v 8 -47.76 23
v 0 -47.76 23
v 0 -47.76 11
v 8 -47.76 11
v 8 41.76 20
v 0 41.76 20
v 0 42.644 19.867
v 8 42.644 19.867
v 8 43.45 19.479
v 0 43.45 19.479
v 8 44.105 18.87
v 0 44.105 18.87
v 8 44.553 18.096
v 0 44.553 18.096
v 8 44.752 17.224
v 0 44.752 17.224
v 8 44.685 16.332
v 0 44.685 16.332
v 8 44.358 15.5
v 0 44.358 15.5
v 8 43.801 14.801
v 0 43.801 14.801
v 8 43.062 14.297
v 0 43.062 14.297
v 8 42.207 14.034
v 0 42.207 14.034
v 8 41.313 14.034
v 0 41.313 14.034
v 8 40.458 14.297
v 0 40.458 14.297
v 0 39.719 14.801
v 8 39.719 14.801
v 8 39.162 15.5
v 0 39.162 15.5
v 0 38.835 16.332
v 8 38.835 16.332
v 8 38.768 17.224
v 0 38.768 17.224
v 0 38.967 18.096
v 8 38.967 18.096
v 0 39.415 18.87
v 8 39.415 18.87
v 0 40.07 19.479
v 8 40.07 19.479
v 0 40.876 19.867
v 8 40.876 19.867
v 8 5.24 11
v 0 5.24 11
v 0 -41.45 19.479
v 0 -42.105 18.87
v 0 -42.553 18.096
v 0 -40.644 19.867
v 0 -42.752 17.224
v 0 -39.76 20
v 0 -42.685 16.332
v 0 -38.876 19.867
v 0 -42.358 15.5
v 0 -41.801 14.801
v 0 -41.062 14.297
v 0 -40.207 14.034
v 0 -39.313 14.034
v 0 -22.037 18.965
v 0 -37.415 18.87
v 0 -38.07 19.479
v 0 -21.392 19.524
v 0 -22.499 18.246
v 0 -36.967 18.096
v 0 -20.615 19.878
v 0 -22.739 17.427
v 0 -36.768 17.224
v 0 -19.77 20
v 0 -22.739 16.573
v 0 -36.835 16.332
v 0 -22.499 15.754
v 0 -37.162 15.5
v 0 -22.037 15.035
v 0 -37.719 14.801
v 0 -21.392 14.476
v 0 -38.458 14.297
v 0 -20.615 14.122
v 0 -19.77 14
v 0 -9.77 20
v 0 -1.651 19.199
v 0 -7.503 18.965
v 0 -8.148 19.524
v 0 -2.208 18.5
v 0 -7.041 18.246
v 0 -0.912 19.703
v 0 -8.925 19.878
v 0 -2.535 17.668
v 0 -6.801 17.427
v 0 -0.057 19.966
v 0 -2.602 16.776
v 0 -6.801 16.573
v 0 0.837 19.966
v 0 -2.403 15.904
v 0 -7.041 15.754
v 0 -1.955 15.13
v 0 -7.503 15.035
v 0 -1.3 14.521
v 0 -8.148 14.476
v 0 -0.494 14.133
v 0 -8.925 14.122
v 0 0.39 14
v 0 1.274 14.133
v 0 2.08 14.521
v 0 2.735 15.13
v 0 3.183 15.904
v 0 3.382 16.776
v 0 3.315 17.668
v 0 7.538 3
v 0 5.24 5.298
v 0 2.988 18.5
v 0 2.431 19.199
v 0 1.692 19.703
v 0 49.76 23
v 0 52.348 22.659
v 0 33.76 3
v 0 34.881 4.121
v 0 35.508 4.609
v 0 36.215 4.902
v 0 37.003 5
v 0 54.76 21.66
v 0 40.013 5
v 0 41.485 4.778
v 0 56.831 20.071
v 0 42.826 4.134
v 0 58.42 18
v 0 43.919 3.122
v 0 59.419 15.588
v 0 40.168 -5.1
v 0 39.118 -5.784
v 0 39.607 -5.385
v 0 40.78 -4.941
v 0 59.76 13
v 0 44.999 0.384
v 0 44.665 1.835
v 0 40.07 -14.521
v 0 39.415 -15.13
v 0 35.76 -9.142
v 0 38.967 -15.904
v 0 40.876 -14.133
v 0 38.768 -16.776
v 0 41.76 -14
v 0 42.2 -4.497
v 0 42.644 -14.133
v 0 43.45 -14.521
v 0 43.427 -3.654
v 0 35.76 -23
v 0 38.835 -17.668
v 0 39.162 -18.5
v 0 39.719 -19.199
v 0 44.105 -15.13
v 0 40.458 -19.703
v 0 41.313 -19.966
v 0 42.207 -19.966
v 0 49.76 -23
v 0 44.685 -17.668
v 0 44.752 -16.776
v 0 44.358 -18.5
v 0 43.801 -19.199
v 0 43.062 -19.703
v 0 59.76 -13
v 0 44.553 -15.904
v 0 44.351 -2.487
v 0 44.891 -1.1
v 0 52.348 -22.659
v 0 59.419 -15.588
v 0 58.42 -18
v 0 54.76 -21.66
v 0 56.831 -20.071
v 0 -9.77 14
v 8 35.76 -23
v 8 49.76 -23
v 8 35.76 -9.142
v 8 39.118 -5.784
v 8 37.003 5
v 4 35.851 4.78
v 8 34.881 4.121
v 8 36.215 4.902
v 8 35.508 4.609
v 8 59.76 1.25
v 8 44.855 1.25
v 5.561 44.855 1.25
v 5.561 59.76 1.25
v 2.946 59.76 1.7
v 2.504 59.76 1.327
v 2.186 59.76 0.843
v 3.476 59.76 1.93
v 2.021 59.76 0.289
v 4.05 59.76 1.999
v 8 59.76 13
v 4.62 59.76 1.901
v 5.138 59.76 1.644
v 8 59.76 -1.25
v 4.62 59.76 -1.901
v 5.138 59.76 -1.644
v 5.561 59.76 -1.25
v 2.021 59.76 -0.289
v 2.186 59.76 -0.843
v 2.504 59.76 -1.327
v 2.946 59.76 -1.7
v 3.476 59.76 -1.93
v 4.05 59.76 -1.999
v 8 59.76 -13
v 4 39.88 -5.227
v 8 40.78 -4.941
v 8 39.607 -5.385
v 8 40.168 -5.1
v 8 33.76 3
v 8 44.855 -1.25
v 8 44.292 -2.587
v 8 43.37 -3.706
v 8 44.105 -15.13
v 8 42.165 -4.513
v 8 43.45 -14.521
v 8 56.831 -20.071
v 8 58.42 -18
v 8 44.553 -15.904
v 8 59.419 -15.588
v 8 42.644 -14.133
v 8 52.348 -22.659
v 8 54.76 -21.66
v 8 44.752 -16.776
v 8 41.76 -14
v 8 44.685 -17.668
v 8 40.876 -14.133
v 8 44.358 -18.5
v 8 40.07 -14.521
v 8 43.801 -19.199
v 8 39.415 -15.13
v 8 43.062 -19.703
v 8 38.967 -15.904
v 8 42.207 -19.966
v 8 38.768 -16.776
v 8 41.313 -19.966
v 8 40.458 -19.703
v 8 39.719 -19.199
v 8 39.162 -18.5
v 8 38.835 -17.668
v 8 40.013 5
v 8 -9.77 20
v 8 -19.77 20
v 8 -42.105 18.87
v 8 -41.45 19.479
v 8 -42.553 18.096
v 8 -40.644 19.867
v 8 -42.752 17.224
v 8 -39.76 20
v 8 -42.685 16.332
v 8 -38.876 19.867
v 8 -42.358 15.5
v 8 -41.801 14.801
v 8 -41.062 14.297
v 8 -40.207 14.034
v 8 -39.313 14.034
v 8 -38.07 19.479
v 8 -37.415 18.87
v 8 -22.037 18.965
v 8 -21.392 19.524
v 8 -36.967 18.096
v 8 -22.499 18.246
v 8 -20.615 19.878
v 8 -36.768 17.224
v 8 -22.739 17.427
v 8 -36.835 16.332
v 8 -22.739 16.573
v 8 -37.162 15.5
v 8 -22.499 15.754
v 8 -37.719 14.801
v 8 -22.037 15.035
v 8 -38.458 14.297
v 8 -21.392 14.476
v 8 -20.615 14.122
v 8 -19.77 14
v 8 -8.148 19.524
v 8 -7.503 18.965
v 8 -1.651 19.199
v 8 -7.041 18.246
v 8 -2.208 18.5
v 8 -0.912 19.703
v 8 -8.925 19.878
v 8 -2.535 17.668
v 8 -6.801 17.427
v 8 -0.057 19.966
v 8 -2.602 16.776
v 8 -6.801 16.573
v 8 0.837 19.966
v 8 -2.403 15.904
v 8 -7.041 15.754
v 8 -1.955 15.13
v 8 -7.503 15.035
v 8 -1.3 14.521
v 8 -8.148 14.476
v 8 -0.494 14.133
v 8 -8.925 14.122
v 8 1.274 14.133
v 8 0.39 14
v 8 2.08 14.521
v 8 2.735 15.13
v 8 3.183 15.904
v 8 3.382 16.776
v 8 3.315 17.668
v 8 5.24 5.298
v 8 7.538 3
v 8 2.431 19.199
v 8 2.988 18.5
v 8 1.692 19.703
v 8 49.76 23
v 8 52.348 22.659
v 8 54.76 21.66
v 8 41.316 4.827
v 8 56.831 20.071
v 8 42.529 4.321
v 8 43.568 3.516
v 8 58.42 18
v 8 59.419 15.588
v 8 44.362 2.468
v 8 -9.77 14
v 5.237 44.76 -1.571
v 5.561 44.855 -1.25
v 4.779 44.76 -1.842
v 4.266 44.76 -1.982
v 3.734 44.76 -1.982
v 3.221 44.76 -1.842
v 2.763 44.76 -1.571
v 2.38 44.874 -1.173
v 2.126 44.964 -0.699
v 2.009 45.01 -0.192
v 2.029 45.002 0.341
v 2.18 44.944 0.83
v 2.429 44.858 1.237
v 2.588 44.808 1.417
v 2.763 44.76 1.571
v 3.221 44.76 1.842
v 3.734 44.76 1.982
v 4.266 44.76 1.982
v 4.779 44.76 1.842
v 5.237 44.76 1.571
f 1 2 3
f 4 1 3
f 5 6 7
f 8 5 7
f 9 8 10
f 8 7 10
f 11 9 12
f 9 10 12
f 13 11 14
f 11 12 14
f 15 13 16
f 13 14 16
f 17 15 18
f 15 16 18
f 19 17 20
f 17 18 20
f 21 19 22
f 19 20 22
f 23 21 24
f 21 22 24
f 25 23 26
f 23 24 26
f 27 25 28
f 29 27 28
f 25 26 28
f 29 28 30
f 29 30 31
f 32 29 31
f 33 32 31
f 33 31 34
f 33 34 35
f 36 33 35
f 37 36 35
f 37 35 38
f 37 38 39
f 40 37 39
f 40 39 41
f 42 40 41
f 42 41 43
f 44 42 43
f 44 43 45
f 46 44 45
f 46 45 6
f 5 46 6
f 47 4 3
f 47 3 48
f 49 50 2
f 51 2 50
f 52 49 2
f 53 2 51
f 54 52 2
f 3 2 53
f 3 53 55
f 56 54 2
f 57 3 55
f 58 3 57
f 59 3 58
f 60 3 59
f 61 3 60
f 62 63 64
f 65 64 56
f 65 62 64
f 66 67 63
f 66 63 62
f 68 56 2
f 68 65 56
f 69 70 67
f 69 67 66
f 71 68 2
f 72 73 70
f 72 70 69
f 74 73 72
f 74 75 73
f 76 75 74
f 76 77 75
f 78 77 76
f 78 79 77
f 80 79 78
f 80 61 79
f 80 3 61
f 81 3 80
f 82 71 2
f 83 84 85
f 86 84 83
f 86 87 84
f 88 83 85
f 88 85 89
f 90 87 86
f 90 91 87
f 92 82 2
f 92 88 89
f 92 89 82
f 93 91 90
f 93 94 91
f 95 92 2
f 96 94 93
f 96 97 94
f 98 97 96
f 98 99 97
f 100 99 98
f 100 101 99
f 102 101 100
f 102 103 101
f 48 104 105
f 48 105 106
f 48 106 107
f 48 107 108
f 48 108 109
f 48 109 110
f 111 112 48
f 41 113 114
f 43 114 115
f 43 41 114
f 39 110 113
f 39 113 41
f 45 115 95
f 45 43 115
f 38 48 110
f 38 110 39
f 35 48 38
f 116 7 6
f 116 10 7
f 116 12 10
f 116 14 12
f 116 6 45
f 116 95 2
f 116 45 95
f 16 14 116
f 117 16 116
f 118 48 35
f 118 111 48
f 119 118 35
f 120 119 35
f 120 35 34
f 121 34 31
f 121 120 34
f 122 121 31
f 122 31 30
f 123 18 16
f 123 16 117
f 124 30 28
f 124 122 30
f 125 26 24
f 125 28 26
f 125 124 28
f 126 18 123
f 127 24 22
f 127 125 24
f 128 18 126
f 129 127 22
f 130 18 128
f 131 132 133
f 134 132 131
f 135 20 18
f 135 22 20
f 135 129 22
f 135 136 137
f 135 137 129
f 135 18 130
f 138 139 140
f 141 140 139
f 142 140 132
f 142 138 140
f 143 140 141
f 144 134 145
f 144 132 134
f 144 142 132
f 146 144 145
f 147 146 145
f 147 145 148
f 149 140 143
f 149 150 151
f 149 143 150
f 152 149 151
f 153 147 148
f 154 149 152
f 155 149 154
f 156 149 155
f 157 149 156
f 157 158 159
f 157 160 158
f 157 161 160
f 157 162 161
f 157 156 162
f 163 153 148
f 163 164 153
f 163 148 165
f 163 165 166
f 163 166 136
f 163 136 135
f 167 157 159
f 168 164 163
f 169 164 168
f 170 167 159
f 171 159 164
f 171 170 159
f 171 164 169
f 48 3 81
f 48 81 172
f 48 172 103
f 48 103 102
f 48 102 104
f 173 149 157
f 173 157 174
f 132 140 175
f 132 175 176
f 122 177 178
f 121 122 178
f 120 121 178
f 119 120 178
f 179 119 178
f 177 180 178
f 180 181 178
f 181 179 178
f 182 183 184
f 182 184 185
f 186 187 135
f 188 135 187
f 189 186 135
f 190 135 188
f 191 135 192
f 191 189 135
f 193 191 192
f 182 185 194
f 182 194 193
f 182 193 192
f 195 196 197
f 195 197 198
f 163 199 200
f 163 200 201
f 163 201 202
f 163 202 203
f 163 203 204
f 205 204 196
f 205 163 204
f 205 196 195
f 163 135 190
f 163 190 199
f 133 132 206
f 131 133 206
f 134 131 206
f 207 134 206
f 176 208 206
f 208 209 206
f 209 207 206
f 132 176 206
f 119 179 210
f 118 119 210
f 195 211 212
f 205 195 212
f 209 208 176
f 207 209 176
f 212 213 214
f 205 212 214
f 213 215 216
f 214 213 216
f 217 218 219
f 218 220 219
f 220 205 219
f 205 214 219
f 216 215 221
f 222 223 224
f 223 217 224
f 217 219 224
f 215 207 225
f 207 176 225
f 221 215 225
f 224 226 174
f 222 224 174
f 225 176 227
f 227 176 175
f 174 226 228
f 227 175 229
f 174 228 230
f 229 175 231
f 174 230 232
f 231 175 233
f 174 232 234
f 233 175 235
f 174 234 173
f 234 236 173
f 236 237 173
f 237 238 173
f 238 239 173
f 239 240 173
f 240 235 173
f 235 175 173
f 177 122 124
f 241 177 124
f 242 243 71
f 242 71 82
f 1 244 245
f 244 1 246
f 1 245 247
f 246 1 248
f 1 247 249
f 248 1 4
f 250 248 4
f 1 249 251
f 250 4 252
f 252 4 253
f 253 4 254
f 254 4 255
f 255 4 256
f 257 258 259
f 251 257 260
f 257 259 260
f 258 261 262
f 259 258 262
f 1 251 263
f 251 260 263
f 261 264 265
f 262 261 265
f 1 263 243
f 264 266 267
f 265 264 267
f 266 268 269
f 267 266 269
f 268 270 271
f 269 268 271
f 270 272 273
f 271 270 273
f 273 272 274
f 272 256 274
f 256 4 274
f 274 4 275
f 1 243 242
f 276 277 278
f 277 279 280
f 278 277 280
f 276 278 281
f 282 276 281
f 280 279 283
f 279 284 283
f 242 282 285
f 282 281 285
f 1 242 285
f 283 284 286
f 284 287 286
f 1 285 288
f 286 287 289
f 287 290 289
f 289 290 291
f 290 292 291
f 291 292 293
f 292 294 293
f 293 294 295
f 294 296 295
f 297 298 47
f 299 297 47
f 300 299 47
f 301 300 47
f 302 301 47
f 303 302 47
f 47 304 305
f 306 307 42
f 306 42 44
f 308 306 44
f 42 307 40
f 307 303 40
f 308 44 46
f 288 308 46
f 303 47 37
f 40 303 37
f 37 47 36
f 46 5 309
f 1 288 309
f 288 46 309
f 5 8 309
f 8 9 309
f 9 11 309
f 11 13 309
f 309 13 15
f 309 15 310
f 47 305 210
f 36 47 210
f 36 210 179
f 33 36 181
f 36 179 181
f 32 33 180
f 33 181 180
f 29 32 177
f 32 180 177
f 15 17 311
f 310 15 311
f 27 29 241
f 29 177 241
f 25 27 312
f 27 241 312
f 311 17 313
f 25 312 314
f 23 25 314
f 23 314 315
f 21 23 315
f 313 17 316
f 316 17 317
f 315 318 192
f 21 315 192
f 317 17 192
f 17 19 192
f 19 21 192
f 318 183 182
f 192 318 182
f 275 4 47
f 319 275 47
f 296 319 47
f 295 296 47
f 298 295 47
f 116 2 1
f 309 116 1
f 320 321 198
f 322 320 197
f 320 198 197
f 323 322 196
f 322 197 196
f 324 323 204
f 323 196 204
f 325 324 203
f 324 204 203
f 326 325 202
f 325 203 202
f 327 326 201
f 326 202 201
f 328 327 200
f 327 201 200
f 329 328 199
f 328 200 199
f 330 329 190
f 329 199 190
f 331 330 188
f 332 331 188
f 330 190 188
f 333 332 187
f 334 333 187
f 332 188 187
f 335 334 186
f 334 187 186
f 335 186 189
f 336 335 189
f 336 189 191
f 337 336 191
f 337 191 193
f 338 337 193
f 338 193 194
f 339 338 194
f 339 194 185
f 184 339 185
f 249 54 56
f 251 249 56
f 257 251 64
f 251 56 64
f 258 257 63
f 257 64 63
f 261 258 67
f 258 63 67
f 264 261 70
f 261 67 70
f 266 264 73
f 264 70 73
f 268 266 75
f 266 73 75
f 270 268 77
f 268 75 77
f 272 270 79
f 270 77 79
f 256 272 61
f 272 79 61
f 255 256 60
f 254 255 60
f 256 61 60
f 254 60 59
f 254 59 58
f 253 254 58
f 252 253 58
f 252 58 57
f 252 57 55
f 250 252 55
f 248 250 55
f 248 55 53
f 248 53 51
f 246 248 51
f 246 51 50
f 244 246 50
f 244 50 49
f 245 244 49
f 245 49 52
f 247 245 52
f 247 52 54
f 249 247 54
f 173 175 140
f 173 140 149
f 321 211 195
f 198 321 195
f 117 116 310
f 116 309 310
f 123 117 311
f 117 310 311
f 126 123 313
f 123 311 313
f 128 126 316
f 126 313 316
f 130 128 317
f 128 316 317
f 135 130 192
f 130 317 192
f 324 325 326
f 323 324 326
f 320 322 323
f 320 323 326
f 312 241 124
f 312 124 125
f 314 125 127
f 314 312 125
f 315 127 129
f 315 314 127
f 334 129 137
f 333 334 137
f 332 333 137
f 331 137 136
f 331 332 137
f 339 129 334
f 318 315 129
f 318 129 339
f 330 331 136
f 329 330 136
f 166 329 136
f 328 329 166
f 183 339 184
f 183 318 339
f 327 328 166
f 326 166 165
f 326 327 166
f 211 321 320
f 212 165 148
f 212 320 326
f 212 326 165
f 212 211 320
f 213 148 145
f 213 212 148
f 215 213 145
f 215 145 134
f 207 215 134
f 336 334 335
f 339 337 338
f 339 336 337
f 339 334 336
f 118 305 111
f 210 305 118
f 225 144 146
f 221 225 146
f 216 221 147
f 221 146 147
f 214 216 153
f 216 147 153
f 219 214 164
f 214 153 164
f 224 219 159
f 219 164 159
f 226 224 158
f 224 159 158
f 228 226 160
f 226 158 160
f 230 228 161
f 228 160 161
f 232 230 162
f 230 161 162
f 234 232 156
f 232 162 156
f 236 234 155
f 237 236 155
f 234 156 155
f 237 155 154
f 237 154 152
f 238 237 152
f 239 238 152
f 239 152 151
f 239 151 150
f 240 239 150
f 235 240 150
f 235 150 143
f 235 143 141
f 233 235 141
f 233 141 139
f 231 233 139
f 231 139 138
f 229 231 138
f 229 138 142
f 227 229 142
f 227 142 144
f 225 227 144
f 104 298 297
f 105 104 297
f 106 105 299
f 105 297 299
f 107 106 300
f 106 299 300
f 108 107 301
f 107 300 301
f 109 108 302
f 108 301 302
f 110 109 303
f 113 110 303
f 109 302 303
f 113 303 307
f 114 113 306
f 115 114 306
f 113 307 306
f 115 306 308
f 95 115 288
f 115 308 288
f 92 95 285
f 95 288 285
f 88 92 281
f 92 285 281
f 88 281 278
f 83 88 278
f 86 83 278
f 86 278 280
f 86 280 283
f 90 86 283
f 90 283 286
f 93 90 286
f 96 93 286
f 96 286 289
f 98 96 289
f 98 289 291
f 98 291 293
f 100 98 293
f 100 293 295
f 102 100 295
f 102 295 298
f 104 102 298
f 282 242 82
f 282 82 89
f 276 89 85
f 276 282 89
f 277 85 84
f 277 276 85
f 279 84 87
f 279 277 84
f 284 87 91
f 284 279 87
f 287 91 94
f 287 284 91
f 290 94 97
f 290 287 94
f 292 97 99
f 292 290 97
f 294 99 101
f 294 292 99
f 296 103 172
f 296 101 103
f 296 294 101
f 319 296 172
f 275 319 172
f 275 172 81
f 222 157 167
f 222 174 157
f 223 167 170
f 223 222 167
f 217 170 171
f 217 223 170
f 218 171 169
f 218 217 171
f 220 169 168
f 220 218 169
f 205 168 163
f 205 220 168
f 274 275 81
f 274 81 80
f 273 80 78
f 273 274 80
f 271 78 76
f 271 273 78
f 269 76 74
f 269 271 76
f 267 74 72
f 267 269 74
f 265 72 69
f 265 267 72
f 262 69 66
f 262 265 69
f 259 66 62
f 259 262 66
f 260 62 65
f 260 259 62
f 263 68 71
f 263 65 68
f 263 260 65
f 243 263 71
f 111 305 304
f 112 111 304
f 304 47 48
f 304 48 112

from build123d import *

# Parameters (mm, degrees)
SKETCH1_W                       = 46
SKETCH1_H                       = 95.52
BOSS_EXTRUDE1_DEPTH             = 8
F_6_0MM_CLEARANCE_DOWEL_HOLE1_D = 6
SKETCH4_W                       = 8
SKETCH4_H                       = 46
BOSS_EXTRUDE2_DEPTH             = 12
FILLET1_R                       = 10
SKETCH6_R                       = 2
CUT_EXTRUDE2_DEPTH              = 15
SKETCH9_W                       = 26
SKETCH9_H                       = 30.52
CUT_EXTRUDE5_DEPTH              = 65.531059189
F_6_0MM_CLEARANCE_DOWEL_HOLE2_D = 6
CUT_EXTRUDE13_DEPTH             = 65.531059189
SKETCH7_W                       = 2.5
SKETCH7_H                       = 15
CUT_EXTRUDE12_DEPTH             = 4
SKETCH16_W                      = 34
SKETCH16_H                      = 53
CUT_EXTRUDE9_DEPTH              = 65.531059294
CUT_EXTRUDE14_DEPTH             = 65.531059294
CUT_EXTRUDE15_DEPTH             = 65.531059294
FILLET2_START                   = -1
FILLET2_DEPTH                   = 10
SKETCH22_R                      = 3
CUT_EXTRUDE16_DEPTH             = 65.531059329


with BuildPart() as part:
    # Sketch1 → Boss-Extrude1 (new body)
    with BuildSketch(Plane(origin=(0, 0, 0), x_dir=(0, 0, -1), z_dir=(1, 0, 0))):
        Rectangle(SKETCH1_W, SKETCH1_H)
    extrude(amount=BOSS_EXTRUDE1_DEPTH)

    # Ø6.0mm Clearance Dowel Hole1 (through all)
    with Locations(Plane(origin=(8, 0, 0), x_dir=(0, 0, -1), z_dir=(1, 0, 0))):
        with Locations((-17, 41.76), (17, 41.76)):
            Hole(F_6_0MM_CLEARANCE_DOWEL_HOLE1_D / 2)

    # Sketch4 → Boss-Extrude2 (add)
    with BuildSketch(Plane(origin=(0, 47.76, 0), x_dir=(1, 0, 0), z_dir=(0, 1, 0))):
        with Locations((4, 0)):
            Rectangle(SKETCH4_W, SKETCH4_H)
    extrude(amount=BOSS_EXTRUDE2_DEPTH)

    # Fillet1
    fillet1_edges = [part.edges().sort_by_distance(p)[0] for p in [
        (4, 59.76, 23),
        (4, 59.76, -23),
    ]]
    fillet(fillet1_edges, radius=FILLET1_R)

    # Sketch6 → Cut-Extrude2 (cut)
    with BuildSketch(Plane(origin=(0, 59.76, 0), x_dir=(1, 0, 0), z_dir=(0, 1, 0))):
        with Locations(Location((4, 0, 0), (0, 0, 270))):
            Circle(SKETCH6_R)
    extrude(amount=-CUT_EXTRUDE2_DEPTH, mode=Mode.SUBTRACT)

    # Sketch9 → Cut-Extrude5 (cut, through all)
    with BuildSketch(Plane(origin=(8, 0, 0), x_dir=(0, 0, -1), z_dir=(1, 0, 0))):
        with Locations((10, 20.5)):
            Rectangle(SKETCH9_W, SKETCH9_H)
    extrude(amount=-CUT_EXTRUDE5_DEPTH, mode=Mode.SUBTRACT)

    # Ø6.0mm Clearance Dowel Hole2 (through all)
    with Locations(Plane(origin=(8, 0, 0), x_dir=(0, 0, -1), z_dir=(1, 0, 0))):
        with Locations((-17, -39.76)):
            Hole(F_6_0MM_CLEARANCE_DOWEL_HOLE2_D / 2)

    # Sketch14 → Cut-Extrude13 (cut, through all)
    with BuildSketch(Plane(origin=(8, 0, 0), x_dir=(0, 0, -1), z_dir=(1, 0, 0))):
        with BuildLine():
            Line((5, 40.013359235), (5, 35.76))
            Line((5, 35.76), (-5, 35.76))
            Line((-5, 35.76), (-5, 40.013359235))
            ThreePointArc((-5, 40.013359235), (0, 45.013359235), (5, 40.013359235))
        make_face()
    extrude(amount=-CUT_EXTRUDE13_DEPTH, mode=Mode.SUBTRACT)

    # Sketch7 → Cut-Extrude12 (cut)
    with BuildSketch(Plane(origin=(8, 0, 0), x_dir=(0, 0, -1), z_dir=(1, 0, 0))):
        with Locations((0, 52.26)):
            Rectangle(SKETCH7_W, SKETCH7_H)
    extrude(amount=-CUT_EXTRUDE12_DEPTH, mode=Mode.SUBTRACT)

    # Sketch16 → Cut-Extrude9 (cut, through all)
    with BuildSketch(Plane(origin=(8, 0, 0), x_dir=(0, 0, -1), z_dir=(1, 0, 0))):
        with Locations((6, -21.26)):
            Rectangle(SKETCH16_W, SKETCH16_H)
    extrude(amount=-CUT_EXTRUDE9_DEPTH, mode=Mode.SUBTRACT)

    # Sketch19 → Cut-Extrude14 (cut, through all)
    with BuildSketch(Plane(origin=(8, 0, 0), x_dir=(0, 0, -1), z_dir=(1, 0, 0))):
        Polygon((-5, 35.76), (3.485281374, 27.274718626), (10.556349186, 34.345786438), (2.071067812, 42.831067812), align=None)
    extrude(amount=-CUT_EXTRUDE14_DEPTH, mode=Mode.SUBTRACT)

    # Sketch21 → Cut-Extrude15 (cut, through all)
    with BuildSketch(Plane(origin=(8, 0, 0), x_dir=(0, 0, -1), z_dir=(1, 0, 0))):
        Polygon((-3, 7.538097039), (-5.298097039, 5.24), (-3, 5.24), align=None)
    extrude(amount=-CUT_EXTRUDE15_DEPTH, mode=Mode.SUBTRACT)

    # Fillet2: read off the stored shape, not the designer's step
    # Fillet2 outline → Fillet2 (cut)
    with BuildSketch(Plane.YZ.offset(FILLET2_START)):
        with BuildLine():
            add(Edge.make_bspline(
                [(40.779548187, -4.94094672), (39.810996275, -5.091139348), (39.117941215, -5.784194408)],
                knots=[0, 0, 0, 1, 1, 1], degree=2))
            ThreePointArc((40.779548187, -4.94094672), (40.397589895, -4.98521482), (40.013359235, -5))
            Line((40.013359235, -5), (39.902135624, -5))
            Line((39.902135624, -5), (39.117941215, -5.784194408))
        make_face()
    extrude(amount=FILLET2_DEPTH, mode=Mode.SUBTRACT)

    # Fillet3
    # a fillet whose section is not a circle: 3 mm, written as the material it adds along each edge
    with BuildSketch(Plane(origin=(8, 35.76, 5), x_dir=(0, 1, 0), z_dir=(-1, 0, 0))) as fillet3_piece_1:
        with BuildLine():
            Bezier((1.242640687, 0), (0, 0), (-0.878679656, 0.878679656), weights=[1, 1, 1])
            Line((-0.878679656, 0.878679656), (0, 0))
            Line((0, 0), (1.242640687, 0))
        make_face()
    extrude(amount=8)

    # Sketch22 → Cut-Extrude16 (cut, through all)
    with BuildSketch(Plane(origin=(8, 0, 0), x_dir=(0, 0, -1), z_dir=(1, 0, 0))):
        with Locations((-17, 0.39)):
            Circle(SKETCH22_R)
        with BuildLine():
            Line((-14, -9.77), (-14, -19.77))
            ThreePointArc((-14, -19.77), (-17, -22.77), (-20, -19.77))
            Line((-20, -19.77), (-20, -9.77))
            ThreePointArc((-20, -9.77), (-17, -6.77), (-14, -9.77))
        make_face()
    extrude(amount=-CUT_EXTRUDE16_DEPTH, mode=Mode.SUBTRACT)


solid = part.part
